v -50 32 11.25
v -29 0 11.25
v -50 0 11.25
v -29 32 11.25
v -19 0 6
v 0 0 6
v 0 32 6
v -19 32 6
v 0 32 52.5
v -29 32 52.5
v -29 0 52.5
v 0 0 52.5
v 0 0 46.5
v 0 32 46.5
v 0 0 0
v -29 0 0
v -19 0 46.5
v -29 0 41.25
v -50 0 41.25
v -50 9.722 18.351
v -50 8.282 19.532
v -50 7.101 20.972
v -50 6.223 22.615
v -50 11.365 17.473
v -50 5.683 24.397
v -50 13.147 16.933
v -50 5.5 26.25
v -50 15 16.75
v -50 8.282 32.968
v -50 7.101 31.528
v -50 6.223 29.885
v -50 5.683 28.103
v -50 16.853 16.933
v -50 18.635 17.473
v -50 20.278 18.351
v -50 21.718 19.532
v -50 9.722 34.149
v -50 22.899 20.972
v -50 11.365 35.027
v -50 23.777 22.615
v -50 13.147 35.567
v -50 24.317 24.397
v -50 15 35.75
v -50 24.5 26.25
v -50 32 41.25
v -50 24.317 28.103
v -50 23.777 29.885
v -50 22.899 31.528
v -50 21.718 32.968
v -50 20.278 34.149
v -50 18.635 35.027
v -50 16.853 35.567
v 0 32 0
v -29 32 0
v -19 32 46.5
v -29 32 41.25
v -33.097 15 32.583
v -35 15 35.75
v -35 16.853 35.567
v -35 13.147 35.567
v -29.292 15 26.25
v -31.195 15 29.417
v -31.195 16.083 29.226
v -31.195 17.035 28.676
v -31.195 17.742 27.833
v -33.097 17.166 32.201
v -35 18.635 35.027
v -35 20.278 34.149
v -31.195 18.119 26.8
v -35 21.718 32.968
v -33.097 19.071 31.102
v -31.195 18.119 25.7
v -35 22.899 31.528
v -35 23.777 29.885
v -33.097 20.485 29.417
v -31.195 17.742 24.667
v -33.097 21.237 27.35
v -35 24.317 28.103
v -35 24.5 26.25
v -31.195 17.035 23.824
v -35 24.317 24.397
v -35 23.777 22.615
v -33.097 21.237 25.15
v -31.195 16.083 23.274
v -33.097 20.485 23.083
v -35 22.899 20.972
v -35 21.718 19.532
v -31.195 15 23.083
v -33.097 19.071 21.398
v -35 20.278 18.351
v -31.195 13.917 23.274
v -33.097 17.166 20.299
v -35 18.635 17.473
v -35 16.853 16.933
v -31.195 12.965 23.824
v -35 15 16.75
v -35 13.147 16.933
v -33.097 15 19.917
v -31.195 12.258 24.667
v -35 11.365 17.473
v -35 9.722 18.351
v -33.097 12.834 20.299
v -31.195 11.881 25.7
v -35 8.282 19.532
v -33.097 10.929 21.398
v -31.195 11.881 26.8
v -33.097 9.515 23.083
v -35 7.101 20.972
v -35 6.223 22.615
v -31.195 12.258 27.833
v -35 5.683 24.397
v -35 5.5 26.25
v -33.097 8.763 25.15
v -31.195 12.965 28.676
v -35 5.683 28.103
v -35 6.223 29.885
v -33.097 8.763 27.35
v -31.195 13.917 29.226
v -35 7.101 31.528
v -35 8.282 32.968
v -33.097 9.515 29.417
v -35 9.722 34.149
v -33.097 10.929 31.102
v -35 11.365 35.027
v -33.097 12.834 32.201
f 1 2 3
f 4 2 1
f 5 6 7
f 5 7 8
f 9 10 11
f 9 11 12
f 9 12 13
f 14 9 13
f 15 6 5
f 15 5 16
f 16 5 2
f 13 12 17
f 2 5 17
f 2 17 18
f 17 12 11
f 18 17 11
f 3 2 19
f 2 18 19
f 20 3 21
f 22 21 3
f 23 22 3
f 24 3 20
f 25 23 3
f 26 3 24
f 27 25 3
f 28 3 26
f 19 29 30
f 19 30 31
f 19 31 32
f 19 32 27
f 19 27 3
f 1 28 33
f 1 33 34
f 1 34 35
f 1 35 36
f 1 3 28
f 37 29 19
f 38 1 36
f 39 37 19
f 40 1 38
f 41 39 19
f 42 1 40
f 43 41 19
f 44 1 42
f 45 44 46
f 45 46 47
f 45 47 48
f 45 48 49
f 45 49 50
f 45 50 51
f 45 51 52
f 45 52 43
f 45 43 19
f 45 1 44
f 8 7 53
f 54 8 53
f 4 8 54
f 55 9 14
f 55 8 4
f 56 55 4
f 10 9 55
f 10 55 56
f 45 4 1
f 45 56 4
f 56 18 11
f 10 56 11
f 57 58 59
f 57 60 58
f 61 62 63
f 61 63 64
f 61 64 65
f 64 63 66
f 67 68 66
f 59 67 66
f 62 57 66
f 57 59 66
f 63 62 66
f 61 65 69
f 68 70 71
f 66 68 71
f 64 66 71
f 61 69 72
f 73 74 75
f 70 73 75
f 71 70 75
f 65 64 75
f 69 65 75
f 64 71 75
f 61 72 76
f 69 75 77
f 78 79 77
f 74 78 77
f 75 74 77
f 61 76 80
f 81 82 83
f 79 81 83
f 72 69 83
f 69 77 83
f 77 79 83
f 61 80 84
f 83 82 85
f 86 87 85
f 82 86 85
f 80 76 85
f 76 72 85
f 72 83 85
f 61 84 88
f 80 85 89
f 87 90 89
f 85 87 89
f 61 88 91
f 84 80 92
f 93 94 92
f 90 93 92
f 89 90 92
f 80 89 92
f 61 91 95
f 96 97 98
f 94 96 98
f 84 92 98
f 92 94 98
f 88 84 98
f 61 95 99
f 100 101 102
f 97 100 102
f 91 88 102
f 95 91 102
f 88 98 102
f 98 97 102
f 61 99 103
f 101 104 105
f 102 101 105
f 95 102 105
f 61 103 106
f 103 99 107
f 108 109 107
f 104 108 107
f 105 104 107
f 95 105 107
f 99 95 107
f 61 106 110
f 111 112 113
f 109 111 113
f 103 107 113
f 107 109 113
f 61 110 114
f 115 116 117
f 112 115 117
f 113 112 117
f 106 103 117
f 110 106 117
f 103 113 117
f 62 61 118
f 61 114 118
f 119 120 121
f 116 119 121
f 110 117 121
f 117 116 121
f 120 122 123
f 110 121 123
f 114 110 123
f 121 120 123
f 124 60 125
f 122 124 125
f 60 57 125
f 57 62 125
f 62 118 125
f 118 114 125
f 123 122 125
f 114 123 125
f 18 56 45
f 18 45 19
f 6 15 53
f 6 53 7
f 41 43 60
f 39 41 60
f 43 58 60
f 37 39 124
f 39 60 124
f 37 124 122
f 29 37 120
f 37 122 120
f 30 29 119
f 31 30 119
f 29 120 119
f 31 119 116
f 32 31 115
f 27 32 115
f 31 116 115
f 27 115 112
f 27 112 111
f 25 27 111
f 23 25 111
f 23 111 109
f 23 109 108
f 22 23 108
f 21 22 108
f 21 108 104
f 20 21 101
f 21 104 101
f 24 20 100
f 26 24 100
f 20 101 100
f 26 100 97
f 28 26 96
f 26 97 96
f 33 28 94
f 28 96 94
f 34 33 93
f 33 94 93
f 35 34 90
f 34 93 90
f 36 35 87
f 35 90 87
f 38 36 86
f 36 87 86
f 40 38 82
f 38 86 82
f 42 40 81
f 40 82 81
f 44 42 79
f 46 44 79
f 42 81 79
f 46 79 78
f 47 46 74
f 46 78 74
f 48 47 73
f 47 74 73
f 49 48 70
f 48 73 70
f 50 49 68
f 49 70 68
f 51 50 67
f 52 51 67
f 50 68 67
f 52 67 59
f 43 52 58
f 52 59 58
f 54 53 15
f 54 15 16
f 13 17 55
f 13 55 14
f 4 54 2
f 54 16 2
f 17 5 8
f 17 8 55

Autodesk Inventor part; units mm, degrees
ref_plane "YZ Plane" through (0, 0, 0) normal (1, 0, 0) x (0, 1, 0)
ref_plane "XZ Plane" through (0, 0, 0) normal (0, 1, 0) x (-1, 0, 0)
ref_plane "XY Plane" through (0, 0, 0) normal (0, 0, 1) x (1, 0, 0)
sketch "Sketch5" plane through (0, 0, 0) normal (0, 1, 0) x (-1, 0, 0)
  line L0 (0, 0) -> (29, 0)
  line L1 (29, 0) -> (29, 52.5)
  line L2 (29, 52.5) -> (0, 52.5)
  line L3 (0, 0) -> (0, 6)
  line L4 (0, 6) -> (19, 6)
  line L5 (19, 6) -> (19, 46.5)
  line L6 (19, 46.5) -> (0, 46.5)
  line L7 (0, 52.5) -> (0, 46.5)
  line L8 (0, 6) -> (0, 0)
  dimension "d96" = 29
  dimension "d97" = 52.5
  dimension "d98" = 6
  dimension "d99" = 19
  dimension "d101" = 40.5
extrude "Extrusion3" add sketch "Sketch5" along normal blind 32
sketch "Sketch6" plane through (-29, 0, 0) normal (-1, 0, 0) x (0, 0, 1)
  line L0 (26.25, 32) -> (41.25, 32)
  line L1 (41.25, 32) -> (41.25, 0)
  line L2 (41.25, 0) -> (11.25, 0)
  line L3 (11.25, 0) -> (11.25, 32)
  line L4 (11.25, 32) -> (26.25, 32)
  line L5 (0, 0) -> (52.5, 0) projected
  line L6 (0, 0) -> (0, 32) projected
  dimension "d106" = 15
  dimension "d107" = 32
  dimension "d108" = 30
  dimension "d109" = 32
  dimension "d110" = 0
  dimension "d111" = 11.25
extrude "Extrusion4" add sketch "Sketch6" along normal blind 21
hole "Hole8" at (-50, 15, 26.25) direction (1, 0, 0) diameter 19 depth 15 tip angle 118
properties part number "GARFO" material "Aluminium AW-7020"
